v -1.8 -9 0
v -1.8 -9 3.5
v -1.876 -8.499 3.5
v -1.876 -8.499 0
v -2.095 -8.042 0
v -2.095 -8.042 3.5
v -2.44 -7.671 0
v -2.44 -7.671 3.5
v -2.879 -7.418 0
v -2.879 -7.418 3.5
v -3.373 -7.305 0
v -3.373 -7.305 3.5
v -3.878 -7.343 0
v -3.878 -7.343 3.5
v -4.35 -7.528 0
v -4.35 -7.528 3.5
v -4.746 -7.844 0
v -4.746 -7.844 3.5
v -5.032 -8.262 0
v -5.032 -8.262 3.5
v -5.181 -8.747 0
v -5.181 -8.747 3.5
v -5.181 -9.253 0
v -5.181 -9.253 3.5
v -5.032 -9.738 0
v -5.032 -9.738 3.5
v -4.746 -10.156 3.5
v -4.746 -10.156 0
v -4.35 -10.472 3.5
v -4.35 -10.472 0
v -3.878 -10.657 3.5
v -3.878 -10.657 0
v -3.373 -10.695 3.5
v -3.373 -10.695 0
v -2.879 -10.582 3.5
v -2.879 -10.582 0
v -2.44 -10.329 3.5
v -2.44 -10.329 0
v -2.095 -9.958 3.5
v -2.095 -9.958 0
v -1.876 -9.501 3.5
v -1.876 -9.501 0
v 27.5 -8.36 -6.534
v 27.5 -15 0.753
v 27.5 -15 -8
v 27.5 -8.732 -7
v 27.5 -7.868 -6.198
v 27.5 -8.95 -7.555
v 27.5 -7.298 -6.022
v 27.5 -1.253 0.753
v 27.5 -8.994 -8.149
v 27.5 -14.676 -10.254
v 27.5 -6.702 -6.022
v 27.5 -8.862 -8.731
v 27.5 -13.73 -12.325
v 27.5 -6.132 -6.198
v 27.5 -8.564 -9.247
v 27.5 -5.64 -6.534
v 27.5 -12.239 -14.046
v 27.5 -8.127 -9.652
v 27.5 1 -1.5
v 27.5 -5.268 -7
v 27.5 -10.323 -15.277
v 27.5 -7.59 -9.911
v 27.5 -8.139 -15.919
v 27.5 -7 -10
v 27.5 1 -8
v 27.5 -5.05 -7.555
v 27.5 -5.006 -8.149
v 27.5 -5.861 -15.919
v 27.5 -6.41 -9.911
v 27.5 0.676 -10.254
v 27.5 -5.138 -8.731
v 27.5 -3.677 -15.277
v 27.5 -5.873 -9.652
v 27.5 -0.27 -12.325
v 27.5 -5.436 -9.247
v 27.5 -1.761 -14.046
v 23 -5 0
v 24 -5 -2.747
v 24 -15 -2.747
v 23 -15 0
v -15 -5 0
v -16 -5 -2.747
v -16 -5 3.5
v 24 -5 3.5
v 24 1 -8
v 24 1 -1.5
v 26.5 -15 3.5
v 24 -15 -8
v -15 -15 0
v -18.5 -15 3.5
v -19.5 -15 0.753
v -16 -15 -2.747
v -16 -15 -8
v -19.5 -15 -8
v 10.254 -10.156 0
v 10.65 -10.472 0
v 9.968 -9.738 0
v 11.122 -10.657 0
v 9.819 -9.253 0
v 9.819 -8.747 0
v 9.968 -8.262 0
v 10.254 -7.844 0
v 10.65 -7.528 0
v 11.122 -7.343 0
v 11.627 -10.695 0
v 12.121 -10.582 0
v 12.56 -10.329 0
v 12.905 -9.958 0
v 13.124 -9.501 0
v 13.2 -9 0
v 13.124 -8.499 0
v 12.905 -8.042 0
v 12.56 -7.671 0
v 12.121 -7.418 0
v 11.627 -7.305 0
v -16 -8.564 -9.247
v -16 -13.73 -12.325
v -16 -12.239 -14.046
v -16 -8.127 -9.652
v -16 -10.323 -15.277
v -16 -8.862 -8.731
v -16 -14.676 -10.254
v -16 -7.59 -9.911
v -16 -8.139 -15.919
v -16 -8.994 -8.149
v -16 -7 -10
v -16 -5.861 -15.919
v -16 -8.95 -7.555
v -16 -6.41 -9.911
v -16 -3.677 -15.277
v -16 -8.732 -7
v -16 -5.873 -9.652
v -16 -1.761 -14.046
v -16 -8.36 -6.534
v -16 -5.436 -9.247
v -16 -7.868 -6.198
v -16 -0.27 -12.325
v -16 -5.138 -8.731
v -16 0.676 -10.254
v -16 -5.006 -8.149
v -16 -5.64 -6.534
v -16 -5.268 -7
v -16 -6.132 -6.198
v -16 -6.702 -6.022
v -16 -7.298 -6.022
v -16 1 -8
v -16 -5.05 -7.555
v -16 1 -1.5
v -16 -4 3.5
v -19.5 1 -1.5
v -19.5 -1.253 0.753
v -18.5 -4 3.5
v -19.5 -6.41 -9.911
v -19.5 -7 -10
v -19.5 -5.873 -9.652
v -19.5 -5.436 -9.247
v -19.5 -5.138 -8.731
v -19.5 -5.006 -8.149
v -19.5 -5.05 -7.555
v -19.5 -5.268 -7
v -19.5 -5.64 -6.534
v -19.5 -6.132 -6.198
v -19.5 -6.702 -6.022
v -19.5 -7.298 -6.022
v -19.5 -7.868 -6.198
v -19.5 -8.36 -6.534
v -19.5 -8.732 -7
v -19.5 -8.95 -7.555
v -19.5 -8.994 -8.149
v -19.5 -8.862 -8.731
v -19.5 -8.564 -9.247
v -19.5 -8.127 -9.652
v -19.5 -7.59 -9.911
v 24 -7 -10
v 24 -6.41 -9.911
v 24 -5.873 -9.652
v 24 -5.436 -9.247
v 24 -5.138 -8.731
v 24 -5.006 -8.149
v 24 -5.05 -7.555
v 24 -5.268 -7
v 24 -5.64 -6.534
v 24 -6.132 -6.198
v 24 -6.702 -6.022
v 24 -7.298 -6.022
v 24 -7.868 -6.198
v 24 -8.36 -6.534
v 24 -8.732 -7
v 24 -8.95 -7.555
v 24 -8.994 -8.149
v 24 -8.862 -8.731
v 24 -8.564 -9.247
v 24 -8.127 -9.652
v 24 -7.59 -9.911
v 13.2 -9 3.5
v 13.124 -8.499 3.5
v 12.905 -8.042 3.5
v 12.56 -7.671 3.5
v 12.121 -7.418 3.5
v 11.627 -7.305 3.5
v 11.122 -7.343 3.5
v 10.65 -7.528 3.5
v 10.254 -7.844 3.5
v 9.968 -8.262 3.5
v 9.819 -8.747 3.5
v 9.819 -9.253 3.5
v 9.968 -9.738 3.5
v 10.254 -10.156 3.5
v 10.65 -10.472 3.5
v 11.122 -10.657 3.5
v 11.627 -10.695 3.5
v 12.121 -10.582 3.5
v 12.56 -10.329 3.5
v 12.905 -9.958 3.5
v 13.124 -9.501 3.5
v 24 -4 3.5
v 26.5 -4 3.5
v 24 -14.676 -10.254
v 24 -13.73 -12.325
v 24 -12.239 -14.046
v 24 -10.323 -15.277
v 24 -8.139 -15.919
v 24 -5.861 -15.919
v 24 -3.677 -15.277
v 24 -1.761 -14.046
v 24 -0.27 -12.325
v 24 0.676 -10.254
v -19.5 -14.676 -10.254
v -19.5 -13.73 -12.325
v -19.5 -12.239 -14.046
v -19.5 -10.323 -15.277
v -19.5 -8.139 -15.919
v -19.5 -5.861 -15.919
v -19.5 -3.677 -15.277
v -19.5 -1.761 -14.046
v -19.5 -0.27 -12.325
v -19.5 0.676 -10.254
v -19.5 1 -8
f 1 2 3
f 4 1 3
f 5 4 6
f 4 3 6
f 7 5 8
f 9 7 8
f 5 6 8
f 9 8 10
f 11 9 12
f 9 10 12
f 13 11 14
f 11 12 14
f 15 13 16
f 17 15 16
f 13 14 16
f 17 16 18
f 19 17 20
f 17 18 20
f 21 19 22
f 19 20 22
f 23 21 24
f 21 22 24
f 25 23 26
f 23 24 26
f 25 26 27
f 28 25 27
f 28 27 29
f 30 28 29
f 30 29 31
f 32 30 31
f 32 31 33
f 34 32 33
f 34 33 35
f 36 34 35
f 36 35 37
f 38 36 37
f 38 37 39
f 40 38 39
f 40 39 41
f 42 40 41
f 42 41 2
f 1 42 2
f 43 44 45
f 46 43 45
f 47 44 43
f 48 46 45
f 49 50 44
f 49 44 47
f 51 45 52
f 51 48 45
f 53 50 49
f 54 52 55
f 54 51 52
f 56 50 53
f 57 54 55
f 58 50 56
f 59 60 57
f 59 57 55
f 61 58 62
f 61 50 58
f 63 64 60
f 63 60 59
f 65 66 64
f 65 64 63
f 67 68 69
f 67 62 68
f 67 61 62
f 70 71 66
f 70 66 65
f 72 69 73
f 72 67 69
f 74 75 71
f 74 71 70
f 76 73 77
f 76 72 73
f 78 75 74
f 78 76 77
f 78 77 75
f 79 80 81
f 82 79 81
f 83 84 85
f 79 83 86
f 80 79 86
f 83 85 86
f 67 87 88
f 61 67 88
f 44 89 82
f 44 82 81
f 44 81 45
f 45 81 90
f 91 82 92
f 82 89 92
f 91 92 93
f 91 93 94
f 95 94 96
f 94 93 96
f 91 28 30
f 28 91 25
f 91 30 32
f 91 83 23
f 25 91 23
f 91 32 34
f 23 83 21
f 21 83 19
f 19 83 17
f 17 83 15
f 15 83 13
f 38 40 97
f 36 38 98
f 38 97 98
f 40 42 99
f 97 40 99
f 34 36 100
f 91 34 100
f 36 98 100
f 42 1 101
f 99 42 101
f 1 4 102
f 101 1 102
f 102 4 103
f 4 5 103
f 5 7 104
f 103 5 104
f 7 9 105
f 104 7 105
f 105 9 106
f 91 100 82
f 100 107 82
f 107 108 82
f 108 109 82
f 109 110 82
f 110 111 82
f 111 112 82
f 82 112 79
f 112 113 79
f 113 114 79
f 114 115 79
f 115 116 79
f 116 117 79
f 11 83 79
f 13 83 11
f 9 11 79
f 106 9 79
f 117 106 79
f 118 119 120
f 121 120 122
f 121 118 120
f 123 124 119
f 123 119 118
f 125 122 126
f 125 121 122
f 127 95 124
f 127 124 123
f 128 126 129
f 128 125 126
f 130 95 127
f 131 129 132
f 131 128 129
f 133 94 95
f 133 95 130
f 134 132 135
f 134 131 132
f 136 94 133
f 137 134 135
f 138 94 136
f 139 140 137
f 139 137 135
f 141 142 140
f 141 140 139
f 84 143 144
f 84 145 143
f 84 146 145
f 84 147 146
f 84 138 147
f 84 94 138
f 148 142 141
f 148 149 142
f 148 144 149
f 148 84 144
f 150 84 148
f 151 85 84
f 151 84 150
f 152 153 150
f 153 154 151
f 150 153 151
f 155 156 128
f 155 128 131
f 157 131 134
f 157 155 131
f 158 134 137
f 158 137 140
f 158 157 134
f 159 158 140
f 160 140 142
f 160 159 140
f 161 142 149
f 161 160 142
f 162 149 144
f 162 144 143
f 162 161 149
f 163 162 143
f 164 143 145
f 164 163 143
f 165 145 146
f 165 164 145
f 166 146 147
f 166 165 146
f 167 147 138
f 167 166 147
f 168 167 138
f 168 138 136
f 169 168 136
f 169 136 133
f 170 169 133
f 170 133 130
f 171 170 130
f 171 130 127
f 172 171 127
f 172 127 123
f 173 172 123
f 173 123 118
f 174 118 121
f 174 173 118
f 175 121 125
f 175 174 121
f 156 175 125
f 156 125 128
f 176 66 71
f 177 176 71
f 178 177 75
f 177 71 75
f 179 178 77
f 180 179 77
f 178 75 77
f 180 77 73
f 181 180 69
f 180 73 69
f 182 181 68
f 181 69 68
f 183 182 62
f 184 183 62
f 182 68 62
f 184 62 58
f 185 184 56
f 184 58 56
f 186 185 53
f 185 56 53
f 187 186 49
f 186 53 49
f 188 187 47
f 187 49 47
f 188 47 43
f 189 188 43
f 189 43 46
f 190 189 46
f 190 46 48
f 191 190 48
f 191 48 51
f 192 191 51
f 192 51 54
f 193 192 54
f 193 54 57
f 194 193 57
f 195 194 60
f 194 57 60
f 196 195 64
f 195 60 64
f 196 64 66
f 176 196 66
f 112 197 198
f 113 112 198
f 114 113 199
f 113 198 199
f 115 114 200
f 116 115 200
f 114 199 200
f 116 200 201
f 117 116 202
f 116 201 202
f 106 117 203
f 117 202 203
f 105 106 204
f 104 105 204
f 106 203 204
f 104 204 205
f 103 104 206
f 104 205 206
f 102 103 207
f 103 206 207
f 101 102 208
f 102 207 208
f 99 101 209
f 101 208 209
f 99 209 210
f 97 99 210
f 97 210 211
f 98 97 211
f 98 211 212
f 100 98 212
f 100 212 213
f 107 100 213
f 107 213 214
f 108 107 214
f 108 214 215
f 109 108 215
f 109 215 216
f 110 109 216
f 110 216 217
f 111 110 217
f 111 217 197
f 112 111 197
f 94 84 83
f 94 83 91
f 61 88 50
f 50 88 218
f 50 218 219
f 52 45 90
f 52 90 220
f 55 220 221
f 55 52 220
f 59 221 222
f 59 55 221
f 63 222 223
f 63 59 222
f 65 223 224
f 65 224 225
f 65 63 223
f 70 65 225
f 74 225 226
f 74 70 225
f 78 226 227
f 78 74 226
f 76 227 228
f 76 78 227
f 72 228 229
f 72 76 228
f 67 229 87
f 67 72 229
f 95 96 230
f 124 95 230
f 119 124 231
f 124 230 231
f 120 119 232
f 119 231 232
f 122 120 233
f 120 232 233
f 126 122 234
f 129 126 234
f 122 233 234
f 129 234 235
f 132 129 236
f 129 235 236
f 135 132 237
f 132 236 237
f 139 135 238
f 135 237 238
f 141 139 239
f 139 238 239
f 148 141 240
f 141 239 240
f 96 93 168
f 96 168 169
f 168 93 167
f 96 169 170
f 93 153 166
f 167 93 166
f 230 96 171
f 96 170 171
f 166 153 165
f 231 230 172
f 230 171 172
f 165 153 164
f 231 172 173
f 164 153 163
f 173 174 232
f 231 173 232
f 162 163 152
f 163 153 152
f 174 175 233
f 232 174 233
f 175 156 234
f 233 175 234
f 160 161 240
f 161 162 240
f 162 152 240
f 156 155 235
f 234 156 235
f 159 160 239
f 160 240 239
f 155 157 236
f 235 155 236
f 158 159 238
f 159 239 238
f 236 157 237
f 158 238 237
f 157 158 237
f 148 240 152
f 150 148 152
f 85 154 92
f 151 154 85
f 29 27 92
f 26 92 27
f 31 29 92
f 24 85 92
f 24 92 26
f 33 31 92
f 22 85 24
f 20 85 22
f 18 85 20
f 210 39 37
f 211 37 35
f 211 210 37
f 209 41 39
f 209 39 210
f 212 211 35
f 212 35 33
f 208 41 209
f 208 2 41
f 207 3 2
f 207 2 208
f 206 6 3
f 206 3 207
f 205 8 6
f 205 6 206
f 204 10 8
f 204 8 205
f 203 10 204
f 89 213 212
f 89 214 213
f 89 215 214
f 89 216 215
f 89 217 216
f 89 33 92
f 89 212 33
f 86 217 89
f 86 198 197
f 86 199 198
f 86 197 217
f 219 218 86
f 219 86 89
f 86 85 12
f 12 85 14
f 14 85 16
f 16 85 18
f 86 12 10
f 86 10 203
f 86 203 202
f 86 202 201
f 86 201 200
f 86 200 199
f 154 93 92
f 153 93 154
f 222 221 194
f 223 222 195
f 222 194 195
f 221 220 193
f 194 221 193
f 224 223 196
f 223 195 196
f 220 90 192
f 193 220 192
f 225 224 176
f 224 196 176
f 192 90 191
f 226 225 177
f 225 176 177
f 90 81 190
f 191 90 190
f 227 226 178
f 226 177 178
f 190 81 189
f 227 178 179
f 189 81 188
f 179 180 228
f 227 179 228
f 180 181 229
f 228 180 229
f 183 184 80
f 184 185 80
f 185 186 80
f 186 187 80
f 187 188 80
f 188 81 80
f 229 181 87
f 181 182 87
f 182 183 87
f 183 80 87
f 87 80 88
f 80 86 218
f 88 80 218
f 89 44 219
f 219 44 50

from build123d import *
from OCP.BRepFilletAPI import BRepFilletAPI_MakeChamfer

# Parameters (mm, degrees)
SKETCH_1_W          = 47
SKETCH_1_H          = 16
EXTRUDE_1_DEPTH     = 3.5
SKETCH_2_R          = 2
EXTRUDE_2_DEPTH     = 3.5
SKETCH_3_R          = 1.7
CUT_EXTRUDE_1_DEPTH = 10
SKETCH_4_W          = 40
SKETCH_4_H          = 6
CUT_EXTRUDE_2_DEPTH = 10
CHAMFER_4_SIZE      = 1
CHAMFER_4_SIZE2     = 2.747477419
CHAMFER1_SIZE       = 5


with BuildPart() as part:
    # 草图1 → 凸台-拉伸1 (new body)
    with BuildSketch(Plane.XY):
        with Locations((4, -7)):
            Rectangle(SKETCH_1_W, SKETCH_1_H)
    extrude(amount=EXTRUDE_1_DEPTH)

    # 草图2 → 凸台-拉伸2 (add)
    with BuildSketch(Plane(origin=(27.5, 0, 0), x_dir=(0, 0, -1), z_dir=(1, 0, 0))):
        with BuildLine():
            Line((0, 1), (0, -15))
            Line((0, -15), (8, -15))
            ThreePointArc((8, -15), (16, -7), (8, 1))
            Line((8, 1), (0, 1))
        make_face()
        with Locations((8, -7)):
            Circle(SKETCH_2_R, mode=Mode.SUBTRACT)
    extrude_2 = extrude(amount=-EXTRUDE_2_DEPTH)

    # 镜向1: 凸台-拉伸2 across plane
    add(extrude_2.mirror(Plane.ZY.offset(-4)))

    # 草图3 → 切除-拉伸1 (cut)
    with BuildSketch(Plane.XY.offset(3.5)):
        with Locations((11.5, -9)):
            Circle(SKETCH_3_R)
        with Locations((-3.5, -9)):
            Circle(SKETCH_3_R)
    extrude(amount=-CUT_EXTRUDE_1_DEPTH, mode=Mode.SUBTRACT)

    # 草图4 → 切除-拉伸2 (cut)
    with BuildSketch(Plane.XY.offset(3.5)):
        with Locations((4, -2)):
            Rectangle(SKETCH_4_W, SKETCH_4_H)
    extrude(amount=-CUT_EXTRUDE_2_DEPTH, mode=Mode.SUBTRACT)

    # 倒角4: one chamfer whose edges measure the first distance from different faces: ONE call of the kernel's chamfer builder (chamfer() names one face for all edges)
    chamfer_4_edges_1 = [part.edges().sort_by_distance(p)[0] for p in [
        (27.5, -7, 3.5),
        (-19.5, -7, 3.5),
    ]]
    chamfer_4_side_1 = [part.faces().sort_by_distance(p)[0] for p in [
        (4, -9.356389583, 3.5),
    ]]
    chamfer_4_edges_2 = [part.edges().sort_by_distance(p)[0] for p in [
        (-16, -10, 0),
        (24, -10, 0),
    ]]
    chamfer_4_side_2 = [part.faces().sort_by_distance(p)[0] for p in [
        (4, -10.047554813, 0),
    ]]
    chamfer_4 = BRepFilletAPI_MakeChamfer(part.part.solid().wrapped)
    for e in chamfer_4_edges_1:
        chamfer_4.Add(CHAMFER_4_SIZE, CHAMFER_4_SIZE2, e.wrapped, chamfer_4_side_1[0].wrapped)  # the first distance lies on this face
    for e in chamfer_4_edges_2:
        chamfer_4.Add(CHAMFER_4_SIZE, CHAMFER_4_SIZE2, e.wrapped, chamfer_4_side_2[0].wrapped)  # the first distance lies on this face
    add(Compound.cast(chamfer_4.Shape()), mode=Mode.REPLACE)

    # Chamfer1
    chamfer1_edges = [part.edges().sort_by_distance(p)[0] for p in [
        (-17.25, 1, 3.5),
        (25.25, 1, 3.5),
    ]]
    chamfer(chamfer1_edges, length=CHAMFER1_SIZE)


solid = part.part
